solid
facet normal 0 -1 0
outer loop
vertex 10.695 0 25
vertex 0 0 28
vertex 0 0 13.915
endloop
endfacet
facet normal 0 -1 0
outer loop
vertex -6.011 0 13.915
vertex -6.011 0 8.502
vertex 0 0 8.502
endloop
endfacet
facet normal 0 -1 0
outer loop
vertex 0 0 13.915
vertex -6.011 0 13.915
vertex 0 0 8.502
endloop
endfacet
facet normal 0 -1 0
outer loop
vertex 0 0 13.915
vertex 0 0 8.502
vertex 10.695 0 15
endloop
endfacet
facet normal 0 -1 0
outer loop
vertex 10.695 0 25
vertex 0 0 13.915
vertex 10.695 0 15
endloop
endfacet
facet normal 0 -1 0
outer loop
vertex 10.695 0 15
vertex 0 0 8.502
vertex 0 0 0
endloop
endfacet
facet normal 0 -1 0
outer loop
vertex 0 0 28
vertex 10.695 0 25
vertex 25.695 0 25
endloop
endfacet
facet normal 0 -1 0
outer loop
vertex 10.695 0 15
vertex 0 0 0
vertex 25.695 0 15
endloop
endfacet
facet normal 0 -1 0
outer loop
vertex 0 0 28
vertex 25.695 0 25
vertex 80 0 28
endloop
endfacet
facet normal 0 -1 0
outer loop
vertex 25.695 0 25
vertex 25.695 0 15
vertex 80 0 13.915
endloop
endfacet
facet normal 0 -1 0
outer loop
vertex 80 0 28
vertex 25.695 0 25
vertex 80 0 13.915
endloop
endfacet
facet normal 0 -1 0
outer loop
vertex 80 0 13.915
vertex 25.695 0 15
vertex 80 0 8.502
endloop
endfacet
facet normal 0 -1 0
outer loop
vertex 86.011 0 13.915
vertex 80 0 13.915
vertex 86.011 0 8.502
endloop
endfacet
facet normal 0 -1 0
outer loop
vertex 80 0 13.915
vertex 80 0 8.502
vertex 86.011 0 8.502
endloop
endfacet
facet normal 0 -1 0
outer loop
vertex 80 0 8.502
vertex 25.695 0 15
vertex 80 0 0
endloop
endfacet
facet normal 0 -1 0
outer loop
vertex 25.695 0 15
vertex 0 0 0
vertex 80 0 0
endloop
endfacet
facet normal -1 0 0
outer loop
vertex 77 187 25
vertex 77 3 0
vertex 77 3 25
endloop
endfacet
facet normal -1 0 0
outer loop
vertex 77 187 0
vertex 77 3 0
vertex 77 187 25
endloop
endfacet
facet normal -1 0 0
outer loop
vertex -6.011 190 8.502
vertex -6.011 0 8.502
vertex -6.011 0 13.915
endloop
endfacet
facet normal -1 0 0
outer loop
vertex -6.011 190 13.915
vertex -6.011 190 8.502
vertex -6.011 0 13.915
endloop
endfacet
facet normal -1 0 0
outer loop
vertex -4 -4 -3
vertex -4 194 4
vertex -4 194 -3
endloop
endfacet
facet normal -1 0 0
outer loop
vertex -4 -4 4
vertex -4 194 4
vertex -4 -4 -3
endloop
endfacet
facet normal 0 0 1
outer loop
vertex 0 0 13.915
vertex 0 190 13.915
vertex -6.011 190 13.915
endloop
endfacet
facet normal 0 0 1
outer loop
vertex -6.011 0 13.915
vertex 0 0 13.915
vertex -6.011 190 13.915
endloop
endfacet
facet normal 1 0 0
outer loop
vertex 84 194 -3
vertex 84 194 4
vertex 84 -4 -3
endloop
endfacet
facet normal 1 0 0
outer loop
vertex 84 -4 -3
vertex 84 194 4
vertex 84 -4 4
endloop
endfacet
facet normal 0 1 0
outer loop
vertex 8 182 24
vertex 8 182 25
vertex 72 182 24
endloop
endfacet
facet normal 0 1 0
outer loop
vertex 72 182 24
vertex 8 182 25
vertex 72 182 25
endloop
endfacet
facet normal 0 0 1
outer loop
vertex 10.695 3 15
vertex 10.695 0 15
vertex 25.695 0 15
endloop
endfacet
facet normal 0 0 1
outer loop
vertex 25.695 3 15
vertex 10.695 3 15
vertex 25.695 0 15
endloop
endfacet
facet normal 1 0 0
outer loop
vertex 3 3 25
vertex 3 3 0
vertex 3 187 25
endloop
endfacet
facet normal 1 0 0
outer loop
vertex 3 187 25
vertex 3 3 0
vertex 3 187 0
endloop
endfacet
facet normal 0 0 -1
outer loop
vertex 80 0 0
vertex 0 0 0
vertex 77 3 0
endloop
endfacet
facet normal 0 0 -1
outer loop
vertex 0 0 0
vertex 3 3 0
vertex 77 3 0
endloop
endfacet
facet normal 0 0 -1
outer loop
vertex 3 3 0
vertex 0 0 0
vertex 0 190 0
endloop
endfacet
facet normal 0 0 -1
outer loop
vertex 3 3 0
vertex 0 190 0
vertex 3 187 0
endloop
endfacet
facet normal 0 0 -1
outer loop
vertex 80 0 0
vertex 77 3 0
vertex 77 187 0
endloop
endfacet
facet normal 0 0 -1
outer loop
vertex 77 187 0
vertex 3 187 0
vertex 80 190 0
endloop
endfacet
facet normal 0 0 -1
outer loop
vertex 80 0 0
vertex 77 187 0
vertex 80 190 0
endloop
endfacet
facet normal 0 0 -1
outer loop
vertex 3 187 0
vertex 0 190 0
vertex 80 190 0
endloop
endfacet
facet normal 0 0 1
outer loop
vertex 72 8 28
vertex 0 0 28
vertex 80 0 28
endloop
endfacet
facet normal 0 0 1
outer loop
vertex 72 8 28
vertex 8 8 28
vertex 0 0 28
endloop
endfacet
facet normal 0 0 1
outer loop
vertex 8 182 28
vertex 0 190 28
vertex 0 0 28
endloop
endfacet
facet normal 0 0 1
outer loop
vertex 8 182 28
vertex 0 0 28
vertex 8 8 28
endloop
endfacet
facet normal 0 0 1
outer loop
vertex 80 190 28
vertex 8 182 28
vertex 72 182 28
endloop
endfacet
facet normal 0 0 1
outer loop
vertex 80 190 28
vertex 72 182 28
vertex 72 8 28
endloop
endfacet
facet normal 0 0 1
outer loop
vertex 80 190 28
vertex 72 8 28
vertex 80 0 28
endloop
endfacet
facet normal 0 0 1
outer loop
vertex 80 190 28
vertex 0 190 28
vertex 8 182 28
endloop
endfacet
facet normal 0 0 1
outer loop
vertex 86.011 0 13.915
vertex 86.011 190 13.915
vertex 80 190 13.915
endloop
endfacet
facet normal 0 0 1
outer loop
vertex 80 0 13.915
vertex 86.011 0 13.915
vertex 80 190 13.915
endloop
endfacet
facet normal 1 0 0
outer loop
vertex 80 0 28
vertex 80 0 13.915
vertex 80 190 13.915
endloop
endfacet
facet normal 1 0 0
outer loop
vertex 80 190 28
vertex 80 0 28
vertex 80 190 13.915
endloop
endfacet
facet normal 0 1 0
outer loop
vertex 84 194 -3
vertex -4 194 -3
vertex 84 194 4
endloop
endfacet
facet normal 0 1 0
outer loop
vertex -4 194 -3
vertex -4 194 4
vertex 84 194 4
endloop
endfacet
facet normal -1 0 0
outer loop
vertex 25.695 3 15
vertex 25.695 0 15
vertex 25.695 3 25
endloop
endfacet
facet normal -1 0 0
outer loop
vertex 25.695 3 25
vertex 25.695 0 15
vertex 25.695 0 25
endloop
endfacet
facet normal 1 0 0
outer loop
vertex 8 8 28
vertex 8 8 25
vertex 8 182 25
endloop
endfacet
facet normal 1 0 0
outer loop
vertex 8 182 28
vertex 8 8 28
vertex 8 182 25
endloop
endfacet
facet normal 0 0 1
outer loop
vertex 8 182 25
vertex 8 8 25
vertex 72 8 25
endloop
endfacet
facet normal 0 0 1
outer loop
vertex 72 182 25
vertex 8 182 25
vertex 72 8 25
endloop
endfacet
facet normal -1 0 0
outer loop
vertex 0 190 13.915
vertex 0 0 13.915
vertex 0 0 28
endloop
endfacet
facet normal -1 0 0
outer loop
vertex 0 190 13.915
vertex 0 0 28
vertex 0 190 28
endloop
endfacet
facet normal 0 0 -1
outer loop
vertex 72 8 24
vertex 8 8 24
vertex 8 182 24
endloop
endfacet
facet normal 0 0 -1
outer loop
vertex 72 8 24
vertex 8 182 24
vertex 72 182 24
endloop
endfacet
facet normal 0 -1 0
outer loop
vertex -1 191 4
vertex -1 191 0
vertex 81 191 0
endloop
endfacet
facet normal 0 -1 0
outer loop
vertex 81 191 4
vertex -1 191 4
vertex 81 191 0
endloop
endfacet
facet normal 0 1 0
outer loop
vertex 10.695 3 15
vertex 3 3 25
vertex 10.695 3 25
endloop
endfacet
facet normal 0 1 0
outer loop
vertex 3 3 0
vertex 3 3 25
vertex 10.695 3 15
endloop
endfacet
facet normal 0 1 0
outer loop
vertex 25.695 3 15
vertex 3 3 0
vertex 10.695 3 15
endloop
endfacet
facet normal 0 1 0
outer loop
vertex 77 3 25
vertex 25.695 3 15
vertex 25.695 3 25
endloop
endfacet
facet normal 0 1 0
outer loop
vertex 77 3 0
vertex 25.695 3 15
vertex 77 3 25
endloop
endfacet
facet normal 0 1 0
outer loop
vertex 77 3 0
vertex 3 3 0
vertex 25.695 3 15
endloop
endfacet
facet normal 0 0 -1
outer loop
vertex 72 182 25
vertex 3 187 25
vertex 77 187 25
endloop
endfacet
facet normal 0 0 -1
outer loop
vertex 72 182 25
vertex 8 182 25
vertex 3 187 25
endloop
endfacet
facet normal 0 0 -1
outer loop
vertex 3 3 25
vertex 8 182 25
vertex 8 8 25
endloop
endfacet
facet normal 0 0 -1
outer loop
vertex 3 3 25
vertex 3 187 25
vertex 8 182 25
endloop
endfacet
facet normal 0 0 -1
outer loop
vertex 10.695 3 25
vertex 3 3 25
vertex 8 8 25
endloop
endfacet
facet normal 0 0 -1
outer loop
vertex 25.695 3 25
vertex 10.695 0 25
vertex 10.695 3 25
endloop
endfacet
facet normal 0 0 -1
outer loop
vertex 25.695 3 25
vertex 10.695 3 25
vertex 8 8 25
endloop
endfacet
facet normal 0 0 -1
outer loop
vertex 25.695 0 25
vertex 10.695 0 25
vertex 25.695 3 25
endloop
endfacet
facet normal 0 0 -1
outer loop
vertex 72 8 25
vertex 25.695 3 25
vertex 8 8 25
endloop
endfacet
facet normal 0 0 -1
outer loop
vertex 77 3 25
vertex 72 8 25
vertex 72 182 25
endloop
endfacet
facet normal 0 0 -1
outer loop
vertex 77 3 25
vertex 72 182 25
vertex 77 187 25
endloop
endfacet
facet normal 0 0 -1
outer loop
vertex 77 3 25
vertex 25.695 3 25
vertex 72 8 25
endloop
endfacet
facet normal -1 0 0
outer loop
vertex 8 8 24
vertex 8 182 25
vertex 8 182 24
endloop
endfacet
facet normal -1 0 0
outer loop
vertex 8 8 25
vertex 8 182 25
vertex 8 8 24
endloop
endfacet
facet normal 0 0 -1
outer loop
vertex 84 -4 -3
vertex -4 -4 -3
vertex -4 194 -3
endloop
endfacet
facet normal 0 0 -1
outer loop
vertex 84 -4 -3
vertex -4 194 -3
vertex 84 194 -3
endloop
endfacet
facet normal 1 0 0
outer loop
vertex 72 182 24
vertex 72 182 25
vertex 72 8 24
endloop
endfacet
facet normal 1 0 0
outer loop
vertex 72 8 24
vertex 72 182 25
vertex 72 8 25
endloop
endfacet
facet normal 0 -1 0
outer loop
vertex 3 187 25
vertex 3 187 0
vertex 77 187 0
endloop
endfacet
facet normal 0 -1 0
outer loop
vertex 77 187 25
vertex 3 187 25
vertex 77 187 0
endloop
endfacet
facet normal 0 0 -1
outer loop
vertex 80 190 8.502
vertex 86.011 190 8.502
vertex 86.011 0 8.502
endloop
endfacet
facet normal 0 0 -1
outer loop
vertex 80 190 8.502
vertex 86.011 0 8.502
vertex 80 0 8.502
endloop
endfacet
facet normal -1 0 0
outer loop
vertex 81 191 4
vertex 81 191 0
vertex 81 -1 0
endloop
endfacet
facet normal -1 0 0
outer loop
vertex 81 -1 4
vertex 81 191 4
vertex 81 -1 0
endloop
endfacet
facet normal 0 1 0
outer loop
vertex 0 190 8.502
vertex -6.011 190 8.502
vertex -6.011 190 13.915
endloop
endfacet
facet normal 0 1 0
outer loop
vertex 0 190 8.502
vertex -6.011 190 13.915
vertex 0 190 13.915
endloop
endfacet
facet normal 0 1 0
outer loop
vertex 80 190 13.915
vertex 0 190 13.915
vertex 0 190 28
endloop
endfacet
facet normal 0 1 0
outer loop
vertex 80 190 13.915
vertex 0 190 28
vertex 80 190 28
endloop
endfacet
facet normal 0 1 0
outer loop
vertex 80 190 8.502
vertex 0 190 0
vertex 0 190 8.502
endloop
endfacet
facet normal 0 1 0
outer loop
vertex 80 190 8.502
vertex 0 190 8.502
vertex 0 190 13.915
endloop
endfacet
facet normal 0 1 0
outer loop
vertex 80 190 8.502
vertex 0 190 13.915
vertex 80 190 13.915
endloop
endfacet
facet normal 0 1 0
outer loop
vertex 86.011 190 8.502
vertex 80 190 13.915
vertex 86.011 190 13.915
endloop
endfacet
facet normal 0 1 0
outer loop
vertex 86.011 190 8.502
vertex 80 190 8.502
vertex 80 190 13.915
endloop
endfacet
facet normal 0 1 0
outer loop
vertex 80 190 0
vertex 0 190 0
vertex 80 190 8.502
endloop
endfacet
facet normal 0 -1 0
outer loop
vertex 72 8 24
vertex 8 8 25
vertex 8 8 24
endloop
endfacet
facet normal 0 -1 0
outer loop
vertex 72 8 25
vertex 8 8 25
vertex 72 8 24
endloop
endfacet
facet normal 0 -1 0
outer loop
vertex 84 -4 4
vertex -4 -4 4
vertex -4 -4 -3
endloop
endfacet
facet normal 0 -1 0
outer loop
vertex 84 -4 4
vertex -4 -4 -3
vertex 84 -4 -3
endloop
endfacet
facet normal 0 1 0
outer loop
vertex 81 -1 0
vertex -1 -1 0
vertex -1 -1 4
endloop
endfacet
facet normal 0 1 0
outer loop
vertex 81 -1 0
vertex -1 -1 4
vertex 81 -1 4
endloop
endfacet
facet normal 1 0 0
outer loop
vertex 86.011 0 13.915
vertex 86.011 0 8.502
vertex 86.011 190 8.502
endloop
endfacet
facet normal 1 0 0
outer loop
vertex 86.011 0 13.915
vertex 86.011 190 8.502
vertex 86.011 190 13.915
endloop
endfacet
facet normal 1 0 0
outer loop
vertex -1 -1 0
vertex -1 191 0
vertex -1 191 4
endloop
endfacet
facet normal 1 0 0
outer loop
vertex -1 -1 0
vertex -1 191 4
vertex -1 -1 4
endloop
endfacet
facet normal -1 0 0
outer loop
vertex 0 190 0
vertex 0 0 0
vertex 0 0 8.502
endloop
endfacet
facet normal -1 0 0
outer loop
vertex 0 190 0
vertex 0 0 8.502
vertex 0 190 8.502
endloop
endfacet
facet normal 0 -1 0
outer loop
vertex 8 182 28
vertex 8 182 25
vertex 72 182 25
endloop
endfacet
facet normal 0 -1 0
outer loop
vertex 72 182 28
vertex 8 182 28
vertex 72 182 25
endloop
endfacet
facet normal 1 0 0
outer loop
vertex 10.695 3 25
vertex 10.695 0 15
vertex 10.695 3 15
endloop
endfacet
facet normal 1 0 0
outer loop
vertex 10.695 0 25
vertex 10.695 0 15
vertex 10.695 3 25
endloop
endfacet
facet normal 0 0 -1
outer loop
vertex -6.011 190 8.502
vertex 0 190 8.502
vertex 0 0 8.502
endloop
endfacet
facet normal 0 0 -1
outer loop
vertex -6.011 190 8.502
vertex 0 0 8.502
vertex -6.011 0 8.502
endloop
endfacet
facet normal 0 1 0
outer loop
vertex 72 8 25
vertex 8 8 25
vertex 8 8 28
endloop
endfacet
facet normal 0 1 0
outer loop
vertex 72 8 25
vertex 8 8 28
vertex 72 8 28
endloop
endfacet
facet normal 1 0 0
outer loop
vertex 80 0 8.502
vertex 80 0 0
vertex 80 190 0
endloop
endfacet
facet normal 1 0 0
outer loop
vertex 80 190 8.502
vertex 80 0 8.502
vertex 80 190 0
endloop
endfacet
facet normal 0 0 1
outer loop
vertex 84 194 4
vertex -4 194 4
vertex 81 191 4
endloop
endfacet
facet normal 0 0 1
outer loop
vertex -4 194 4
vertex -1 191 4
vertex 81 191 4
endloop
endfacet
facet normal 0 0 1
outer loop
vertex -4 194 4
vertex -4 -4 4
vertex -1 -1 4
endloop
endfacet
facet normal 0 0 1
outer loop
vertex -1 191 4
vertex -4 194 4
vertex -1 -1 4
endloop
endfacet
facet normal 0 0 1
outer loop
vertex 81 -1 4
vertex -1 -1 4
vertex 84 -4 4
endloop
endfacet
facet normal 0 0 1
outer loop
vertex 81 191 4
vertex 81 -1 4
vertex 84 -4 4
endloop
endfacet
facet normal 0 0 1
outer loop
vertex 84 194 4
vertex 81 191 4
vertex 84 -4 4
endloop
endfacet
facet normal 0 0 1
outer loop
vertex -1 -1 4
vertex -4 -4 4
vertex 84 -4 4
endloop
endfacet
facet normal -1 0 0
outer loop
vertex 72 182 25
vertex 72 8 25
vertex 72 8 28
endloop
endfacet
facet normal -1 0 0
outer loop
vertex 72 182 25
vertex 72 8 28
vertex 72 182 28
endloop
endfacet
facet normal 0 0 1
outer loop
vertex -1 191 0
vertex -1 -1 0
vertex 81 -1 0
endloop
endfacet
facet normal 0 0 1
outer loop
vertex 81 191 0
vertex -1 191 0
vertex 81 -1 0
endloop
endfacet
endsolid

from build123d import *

# Parameters (mm, degrees)
F0_W      = 80
F0_H      = 190
F0_W_2    = 74
F0_H_2    = 184
F1_DEPTH  = 25
F2_W      = 80
F2_H      = 190
F2_W_2    = 64
F2_H_2    = 174
F3_DEPTH  = 3
F6_W      = 88
F6_H      = 198
F6_W_2    = 82
F6_H_2    = 192
F7_DEPTH  = 4
F6_W_3    = 80
F6_H_3    = 190
F6_W_4    = 74
F6_H_4    = 184
F8_DEPTH  = 3
F9_W      = 6.0110352933
F9_H      = 5.4130628705
F10_DEPTH = 190
F11_W     = 15
F11_H     = 10
F12_DEPTH = 3
F13_W     = 64
F13_H     = 174
F14_DEPTH = 1


# Not quite as in the source:
# - a feature names something its author has since deleted; it is built from what else it names


with BuildPart() as f1:
    # F0 (on Top) → F1 (new body)
    with BuildSketch(Plane.XY):
        with Locations((40, 95)):
            Rectangle(F0_W, F0_H)
        with Locations((40, 95)):
            Rectangle(F0_W_2, F0_H_2, mode=Mode.SUBTRACT)
    extrude(amount=F1_DEPTH)

    # F2 (on face) → F3 (join)
    with BuildSketch(Plane.XY.offset(25)):
        with Locations((40, 95)):
            Rectangle(F2_W, F2_H)
        with Locations((40, 95)):
            Rectangle(F2_W_2, F2_H_2, mode=Mode.SUBTRACT)
    extrude(amount=F3_DEPTH)

    # F9 (on face) → F10 (join, through all)
    with BuildSketch(Plane(origin=(0, 190, 0), x_dir=(-1, 0, 0), z_dir=(0, 1, 0))):
        with Locations((3.0055176467, 11.2088900059)):
            Rectangle(F9_W, F9_H)
        with Locations((-83.0055176467, 11.2088900059)):
            Rectangle(F9_W, F9_H)
    extrude(amount=-F10_DEPTH)

    # F11 (on face) → F12 (cut, through all)
    with BuildSketch(Plane.XZ):
        with Locations((18.1946381893, 20)):
            Rectangle(F11_W, F11_H)
    extrude(amount=-F12_DEPTH, mode=Mode.SUBTRACT)


with BuildPart() as f7:
    # F6 (on face) → F7 (new body)
    with BuildSketch(Plane(origin=(0, 0, 0), x_dir=(1, 0, 0), z_dir=(0, 0, -1))):
        with Locations((40, -95)):
            Rectangle(F6_W, F6_H)
        with Locations((40, -95)):
            Rectangle(F6_W_2, F6_H_2, mode=Mode.SUBTRACT)
    extrude(amount=-F7_DEPTH)

    # F6 (on face) → F8 (join)
    with BuildSketch(Plane(origin=(0, 0, 0), x_dir=(1, 0, 0), z_dir=(0, 0, -1))):
        with Locations((40, -95)):
            Rectangle(F6_W, F6_H)
        with Locations((40, -95)):
            Rectangle(F6_W_2, F6_H_2, mode=Mode.SUBTRACT)
        with Locations((40, -95)):
            Rectangle(F6_W_2, F6_H_2)
        with Locations((40, -95)):
            Rectangle(F6_W_3, F6_H_3, mode=Mode.SUBTRACT)
        with Locations((40, -95)):
            Rectangle(F6_W_3, F6_H_3)
        with Locations((40, -95)):
            Rectangle(F6_W_4, F6_H_4, mode=Mode.SUBTRACT)
        with Locations((40, -95)):
            Rectangle(F6_W_4, F6_H_4)
    extrude(amount=F8_DEPTH)


with BuildPart() as f14:
    # F13 (on face) → F14 (new body)
    with BuildSketch(Plane(origin=(0, 0, 25), x_dir=(1, 0, 0), z_dir=(0, 0, -1))):
        with Locations((40, -95)):
            Rectangle(F13_W, F13_H)
    extrude(amount=F14_DEPTH)


solid = Compound([f1.part, f7.part, f14.part])
